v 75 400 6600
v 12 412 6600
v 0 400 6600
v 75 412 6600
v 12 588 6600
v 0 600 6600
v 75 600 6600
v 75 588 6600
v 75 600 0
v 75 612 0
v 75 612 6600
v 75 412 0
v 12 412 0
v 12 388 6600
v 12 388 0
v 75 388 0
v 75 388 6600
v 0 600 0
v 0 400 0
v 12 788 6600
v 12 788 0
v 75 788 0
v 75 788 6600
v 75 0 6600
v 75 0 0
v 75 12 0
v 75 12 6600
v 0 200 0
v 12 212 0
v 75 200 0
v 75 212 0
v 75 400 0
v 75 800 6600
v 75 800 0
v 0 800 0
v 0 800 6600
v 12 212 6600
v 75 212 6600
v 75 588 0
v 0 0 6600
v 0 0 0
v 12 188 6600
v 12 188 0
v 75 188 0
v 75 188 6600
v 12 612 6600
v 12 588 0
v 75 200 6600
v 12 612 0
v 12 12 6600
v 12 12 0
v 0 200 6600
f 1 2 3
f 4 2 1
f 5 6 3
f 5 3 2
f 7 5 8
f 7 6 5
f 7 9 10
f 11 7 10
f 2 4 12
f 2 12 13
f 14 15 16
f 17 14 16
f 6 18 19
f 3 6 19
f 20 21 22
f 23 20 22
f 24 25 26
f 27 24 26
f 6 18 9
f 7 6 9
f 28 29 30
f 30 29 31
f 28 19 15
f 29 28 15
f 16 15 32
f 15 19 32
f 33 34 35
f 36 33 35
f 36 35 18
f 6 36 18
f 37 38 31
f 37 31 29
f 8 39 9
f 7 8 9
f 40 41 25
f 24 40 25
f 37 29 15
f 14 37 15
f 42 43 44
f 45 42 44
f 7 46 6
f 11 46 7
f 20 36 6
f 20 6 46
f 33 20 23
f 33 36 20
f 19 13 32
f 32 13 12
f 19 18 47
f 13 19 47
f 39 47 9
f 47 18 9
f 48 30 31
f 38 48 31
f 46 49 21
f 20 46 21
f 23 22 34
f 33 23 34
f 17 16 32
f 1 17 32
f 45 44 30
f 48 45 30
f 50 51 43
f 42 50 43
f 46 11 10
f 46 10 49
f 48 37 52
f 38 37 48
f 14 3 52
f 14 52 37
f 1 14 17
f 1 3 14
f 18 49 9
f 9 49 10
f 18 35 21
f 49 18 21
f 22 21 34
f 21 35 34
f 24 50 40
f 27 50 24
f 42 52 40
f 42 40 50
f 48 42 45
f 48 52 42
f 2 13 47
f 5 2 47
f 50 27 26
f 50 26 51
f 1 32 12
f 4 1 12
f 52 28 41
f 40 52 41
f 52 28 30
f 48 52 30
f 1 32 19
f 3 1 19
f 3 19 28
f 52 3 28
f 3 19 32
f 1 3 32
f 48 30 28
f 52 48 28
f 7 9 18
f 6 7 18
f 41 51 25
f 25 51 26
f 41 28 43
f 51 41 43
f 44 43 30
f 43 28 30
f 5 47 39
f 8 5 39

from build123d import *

# Parameters (mm, degrees)
F1_DEPTH = 6600
F2_DEPTH = 6600
F3_DEPTH = 6600
F4_DEPTH = 6600


with BuildPart() as f1:
    # F0 (on Top) → F1 (new body)
    with BuildSketch(Plane.XY):
        Polygon((0, 200), (0, 0), (75, 0), (75, 12), (12, 12), (12, 188), (75, 188), (75, 200), align=None)
    extrude(amount=F1_DEPTH)


with BuildPart() as f2:
    # F0 (on Top) → F2 (new body)
    with BuildSketch(Plane.XY):
        Polygon((0, 400), (0, 200), (75, 200), (75, 212), (12, 212), (12, 388), (75, 388), (75, 400), align=None)
    extrude(amount=F2_DEPTH)


with BuildPart() as f3:
    # F0 (on Top) → F3 (new body)
    with BuildSketch(Plane.XY):
        Polygon((0, 600), (0, 400), (75, 400), (75, 412), (12, 412), (12, 588), (75, 588), (75, 600), align=None)
    extrude(amount=F3_DEPTH)


with BuildPart() as f4:
    # F0 (on Top) → F4 (new body)
    with BuildSketch(Plane.XY):
        Polygon((0, 800), (0, 600), (75, 600), (75, 612), (12, 612), (12, 788), (75, 788), (75, 800), align=None)
    extrude(amount=F4_DEPTH)


solid = Compound([f1.part, f2.part, f3.part, f4.part])
